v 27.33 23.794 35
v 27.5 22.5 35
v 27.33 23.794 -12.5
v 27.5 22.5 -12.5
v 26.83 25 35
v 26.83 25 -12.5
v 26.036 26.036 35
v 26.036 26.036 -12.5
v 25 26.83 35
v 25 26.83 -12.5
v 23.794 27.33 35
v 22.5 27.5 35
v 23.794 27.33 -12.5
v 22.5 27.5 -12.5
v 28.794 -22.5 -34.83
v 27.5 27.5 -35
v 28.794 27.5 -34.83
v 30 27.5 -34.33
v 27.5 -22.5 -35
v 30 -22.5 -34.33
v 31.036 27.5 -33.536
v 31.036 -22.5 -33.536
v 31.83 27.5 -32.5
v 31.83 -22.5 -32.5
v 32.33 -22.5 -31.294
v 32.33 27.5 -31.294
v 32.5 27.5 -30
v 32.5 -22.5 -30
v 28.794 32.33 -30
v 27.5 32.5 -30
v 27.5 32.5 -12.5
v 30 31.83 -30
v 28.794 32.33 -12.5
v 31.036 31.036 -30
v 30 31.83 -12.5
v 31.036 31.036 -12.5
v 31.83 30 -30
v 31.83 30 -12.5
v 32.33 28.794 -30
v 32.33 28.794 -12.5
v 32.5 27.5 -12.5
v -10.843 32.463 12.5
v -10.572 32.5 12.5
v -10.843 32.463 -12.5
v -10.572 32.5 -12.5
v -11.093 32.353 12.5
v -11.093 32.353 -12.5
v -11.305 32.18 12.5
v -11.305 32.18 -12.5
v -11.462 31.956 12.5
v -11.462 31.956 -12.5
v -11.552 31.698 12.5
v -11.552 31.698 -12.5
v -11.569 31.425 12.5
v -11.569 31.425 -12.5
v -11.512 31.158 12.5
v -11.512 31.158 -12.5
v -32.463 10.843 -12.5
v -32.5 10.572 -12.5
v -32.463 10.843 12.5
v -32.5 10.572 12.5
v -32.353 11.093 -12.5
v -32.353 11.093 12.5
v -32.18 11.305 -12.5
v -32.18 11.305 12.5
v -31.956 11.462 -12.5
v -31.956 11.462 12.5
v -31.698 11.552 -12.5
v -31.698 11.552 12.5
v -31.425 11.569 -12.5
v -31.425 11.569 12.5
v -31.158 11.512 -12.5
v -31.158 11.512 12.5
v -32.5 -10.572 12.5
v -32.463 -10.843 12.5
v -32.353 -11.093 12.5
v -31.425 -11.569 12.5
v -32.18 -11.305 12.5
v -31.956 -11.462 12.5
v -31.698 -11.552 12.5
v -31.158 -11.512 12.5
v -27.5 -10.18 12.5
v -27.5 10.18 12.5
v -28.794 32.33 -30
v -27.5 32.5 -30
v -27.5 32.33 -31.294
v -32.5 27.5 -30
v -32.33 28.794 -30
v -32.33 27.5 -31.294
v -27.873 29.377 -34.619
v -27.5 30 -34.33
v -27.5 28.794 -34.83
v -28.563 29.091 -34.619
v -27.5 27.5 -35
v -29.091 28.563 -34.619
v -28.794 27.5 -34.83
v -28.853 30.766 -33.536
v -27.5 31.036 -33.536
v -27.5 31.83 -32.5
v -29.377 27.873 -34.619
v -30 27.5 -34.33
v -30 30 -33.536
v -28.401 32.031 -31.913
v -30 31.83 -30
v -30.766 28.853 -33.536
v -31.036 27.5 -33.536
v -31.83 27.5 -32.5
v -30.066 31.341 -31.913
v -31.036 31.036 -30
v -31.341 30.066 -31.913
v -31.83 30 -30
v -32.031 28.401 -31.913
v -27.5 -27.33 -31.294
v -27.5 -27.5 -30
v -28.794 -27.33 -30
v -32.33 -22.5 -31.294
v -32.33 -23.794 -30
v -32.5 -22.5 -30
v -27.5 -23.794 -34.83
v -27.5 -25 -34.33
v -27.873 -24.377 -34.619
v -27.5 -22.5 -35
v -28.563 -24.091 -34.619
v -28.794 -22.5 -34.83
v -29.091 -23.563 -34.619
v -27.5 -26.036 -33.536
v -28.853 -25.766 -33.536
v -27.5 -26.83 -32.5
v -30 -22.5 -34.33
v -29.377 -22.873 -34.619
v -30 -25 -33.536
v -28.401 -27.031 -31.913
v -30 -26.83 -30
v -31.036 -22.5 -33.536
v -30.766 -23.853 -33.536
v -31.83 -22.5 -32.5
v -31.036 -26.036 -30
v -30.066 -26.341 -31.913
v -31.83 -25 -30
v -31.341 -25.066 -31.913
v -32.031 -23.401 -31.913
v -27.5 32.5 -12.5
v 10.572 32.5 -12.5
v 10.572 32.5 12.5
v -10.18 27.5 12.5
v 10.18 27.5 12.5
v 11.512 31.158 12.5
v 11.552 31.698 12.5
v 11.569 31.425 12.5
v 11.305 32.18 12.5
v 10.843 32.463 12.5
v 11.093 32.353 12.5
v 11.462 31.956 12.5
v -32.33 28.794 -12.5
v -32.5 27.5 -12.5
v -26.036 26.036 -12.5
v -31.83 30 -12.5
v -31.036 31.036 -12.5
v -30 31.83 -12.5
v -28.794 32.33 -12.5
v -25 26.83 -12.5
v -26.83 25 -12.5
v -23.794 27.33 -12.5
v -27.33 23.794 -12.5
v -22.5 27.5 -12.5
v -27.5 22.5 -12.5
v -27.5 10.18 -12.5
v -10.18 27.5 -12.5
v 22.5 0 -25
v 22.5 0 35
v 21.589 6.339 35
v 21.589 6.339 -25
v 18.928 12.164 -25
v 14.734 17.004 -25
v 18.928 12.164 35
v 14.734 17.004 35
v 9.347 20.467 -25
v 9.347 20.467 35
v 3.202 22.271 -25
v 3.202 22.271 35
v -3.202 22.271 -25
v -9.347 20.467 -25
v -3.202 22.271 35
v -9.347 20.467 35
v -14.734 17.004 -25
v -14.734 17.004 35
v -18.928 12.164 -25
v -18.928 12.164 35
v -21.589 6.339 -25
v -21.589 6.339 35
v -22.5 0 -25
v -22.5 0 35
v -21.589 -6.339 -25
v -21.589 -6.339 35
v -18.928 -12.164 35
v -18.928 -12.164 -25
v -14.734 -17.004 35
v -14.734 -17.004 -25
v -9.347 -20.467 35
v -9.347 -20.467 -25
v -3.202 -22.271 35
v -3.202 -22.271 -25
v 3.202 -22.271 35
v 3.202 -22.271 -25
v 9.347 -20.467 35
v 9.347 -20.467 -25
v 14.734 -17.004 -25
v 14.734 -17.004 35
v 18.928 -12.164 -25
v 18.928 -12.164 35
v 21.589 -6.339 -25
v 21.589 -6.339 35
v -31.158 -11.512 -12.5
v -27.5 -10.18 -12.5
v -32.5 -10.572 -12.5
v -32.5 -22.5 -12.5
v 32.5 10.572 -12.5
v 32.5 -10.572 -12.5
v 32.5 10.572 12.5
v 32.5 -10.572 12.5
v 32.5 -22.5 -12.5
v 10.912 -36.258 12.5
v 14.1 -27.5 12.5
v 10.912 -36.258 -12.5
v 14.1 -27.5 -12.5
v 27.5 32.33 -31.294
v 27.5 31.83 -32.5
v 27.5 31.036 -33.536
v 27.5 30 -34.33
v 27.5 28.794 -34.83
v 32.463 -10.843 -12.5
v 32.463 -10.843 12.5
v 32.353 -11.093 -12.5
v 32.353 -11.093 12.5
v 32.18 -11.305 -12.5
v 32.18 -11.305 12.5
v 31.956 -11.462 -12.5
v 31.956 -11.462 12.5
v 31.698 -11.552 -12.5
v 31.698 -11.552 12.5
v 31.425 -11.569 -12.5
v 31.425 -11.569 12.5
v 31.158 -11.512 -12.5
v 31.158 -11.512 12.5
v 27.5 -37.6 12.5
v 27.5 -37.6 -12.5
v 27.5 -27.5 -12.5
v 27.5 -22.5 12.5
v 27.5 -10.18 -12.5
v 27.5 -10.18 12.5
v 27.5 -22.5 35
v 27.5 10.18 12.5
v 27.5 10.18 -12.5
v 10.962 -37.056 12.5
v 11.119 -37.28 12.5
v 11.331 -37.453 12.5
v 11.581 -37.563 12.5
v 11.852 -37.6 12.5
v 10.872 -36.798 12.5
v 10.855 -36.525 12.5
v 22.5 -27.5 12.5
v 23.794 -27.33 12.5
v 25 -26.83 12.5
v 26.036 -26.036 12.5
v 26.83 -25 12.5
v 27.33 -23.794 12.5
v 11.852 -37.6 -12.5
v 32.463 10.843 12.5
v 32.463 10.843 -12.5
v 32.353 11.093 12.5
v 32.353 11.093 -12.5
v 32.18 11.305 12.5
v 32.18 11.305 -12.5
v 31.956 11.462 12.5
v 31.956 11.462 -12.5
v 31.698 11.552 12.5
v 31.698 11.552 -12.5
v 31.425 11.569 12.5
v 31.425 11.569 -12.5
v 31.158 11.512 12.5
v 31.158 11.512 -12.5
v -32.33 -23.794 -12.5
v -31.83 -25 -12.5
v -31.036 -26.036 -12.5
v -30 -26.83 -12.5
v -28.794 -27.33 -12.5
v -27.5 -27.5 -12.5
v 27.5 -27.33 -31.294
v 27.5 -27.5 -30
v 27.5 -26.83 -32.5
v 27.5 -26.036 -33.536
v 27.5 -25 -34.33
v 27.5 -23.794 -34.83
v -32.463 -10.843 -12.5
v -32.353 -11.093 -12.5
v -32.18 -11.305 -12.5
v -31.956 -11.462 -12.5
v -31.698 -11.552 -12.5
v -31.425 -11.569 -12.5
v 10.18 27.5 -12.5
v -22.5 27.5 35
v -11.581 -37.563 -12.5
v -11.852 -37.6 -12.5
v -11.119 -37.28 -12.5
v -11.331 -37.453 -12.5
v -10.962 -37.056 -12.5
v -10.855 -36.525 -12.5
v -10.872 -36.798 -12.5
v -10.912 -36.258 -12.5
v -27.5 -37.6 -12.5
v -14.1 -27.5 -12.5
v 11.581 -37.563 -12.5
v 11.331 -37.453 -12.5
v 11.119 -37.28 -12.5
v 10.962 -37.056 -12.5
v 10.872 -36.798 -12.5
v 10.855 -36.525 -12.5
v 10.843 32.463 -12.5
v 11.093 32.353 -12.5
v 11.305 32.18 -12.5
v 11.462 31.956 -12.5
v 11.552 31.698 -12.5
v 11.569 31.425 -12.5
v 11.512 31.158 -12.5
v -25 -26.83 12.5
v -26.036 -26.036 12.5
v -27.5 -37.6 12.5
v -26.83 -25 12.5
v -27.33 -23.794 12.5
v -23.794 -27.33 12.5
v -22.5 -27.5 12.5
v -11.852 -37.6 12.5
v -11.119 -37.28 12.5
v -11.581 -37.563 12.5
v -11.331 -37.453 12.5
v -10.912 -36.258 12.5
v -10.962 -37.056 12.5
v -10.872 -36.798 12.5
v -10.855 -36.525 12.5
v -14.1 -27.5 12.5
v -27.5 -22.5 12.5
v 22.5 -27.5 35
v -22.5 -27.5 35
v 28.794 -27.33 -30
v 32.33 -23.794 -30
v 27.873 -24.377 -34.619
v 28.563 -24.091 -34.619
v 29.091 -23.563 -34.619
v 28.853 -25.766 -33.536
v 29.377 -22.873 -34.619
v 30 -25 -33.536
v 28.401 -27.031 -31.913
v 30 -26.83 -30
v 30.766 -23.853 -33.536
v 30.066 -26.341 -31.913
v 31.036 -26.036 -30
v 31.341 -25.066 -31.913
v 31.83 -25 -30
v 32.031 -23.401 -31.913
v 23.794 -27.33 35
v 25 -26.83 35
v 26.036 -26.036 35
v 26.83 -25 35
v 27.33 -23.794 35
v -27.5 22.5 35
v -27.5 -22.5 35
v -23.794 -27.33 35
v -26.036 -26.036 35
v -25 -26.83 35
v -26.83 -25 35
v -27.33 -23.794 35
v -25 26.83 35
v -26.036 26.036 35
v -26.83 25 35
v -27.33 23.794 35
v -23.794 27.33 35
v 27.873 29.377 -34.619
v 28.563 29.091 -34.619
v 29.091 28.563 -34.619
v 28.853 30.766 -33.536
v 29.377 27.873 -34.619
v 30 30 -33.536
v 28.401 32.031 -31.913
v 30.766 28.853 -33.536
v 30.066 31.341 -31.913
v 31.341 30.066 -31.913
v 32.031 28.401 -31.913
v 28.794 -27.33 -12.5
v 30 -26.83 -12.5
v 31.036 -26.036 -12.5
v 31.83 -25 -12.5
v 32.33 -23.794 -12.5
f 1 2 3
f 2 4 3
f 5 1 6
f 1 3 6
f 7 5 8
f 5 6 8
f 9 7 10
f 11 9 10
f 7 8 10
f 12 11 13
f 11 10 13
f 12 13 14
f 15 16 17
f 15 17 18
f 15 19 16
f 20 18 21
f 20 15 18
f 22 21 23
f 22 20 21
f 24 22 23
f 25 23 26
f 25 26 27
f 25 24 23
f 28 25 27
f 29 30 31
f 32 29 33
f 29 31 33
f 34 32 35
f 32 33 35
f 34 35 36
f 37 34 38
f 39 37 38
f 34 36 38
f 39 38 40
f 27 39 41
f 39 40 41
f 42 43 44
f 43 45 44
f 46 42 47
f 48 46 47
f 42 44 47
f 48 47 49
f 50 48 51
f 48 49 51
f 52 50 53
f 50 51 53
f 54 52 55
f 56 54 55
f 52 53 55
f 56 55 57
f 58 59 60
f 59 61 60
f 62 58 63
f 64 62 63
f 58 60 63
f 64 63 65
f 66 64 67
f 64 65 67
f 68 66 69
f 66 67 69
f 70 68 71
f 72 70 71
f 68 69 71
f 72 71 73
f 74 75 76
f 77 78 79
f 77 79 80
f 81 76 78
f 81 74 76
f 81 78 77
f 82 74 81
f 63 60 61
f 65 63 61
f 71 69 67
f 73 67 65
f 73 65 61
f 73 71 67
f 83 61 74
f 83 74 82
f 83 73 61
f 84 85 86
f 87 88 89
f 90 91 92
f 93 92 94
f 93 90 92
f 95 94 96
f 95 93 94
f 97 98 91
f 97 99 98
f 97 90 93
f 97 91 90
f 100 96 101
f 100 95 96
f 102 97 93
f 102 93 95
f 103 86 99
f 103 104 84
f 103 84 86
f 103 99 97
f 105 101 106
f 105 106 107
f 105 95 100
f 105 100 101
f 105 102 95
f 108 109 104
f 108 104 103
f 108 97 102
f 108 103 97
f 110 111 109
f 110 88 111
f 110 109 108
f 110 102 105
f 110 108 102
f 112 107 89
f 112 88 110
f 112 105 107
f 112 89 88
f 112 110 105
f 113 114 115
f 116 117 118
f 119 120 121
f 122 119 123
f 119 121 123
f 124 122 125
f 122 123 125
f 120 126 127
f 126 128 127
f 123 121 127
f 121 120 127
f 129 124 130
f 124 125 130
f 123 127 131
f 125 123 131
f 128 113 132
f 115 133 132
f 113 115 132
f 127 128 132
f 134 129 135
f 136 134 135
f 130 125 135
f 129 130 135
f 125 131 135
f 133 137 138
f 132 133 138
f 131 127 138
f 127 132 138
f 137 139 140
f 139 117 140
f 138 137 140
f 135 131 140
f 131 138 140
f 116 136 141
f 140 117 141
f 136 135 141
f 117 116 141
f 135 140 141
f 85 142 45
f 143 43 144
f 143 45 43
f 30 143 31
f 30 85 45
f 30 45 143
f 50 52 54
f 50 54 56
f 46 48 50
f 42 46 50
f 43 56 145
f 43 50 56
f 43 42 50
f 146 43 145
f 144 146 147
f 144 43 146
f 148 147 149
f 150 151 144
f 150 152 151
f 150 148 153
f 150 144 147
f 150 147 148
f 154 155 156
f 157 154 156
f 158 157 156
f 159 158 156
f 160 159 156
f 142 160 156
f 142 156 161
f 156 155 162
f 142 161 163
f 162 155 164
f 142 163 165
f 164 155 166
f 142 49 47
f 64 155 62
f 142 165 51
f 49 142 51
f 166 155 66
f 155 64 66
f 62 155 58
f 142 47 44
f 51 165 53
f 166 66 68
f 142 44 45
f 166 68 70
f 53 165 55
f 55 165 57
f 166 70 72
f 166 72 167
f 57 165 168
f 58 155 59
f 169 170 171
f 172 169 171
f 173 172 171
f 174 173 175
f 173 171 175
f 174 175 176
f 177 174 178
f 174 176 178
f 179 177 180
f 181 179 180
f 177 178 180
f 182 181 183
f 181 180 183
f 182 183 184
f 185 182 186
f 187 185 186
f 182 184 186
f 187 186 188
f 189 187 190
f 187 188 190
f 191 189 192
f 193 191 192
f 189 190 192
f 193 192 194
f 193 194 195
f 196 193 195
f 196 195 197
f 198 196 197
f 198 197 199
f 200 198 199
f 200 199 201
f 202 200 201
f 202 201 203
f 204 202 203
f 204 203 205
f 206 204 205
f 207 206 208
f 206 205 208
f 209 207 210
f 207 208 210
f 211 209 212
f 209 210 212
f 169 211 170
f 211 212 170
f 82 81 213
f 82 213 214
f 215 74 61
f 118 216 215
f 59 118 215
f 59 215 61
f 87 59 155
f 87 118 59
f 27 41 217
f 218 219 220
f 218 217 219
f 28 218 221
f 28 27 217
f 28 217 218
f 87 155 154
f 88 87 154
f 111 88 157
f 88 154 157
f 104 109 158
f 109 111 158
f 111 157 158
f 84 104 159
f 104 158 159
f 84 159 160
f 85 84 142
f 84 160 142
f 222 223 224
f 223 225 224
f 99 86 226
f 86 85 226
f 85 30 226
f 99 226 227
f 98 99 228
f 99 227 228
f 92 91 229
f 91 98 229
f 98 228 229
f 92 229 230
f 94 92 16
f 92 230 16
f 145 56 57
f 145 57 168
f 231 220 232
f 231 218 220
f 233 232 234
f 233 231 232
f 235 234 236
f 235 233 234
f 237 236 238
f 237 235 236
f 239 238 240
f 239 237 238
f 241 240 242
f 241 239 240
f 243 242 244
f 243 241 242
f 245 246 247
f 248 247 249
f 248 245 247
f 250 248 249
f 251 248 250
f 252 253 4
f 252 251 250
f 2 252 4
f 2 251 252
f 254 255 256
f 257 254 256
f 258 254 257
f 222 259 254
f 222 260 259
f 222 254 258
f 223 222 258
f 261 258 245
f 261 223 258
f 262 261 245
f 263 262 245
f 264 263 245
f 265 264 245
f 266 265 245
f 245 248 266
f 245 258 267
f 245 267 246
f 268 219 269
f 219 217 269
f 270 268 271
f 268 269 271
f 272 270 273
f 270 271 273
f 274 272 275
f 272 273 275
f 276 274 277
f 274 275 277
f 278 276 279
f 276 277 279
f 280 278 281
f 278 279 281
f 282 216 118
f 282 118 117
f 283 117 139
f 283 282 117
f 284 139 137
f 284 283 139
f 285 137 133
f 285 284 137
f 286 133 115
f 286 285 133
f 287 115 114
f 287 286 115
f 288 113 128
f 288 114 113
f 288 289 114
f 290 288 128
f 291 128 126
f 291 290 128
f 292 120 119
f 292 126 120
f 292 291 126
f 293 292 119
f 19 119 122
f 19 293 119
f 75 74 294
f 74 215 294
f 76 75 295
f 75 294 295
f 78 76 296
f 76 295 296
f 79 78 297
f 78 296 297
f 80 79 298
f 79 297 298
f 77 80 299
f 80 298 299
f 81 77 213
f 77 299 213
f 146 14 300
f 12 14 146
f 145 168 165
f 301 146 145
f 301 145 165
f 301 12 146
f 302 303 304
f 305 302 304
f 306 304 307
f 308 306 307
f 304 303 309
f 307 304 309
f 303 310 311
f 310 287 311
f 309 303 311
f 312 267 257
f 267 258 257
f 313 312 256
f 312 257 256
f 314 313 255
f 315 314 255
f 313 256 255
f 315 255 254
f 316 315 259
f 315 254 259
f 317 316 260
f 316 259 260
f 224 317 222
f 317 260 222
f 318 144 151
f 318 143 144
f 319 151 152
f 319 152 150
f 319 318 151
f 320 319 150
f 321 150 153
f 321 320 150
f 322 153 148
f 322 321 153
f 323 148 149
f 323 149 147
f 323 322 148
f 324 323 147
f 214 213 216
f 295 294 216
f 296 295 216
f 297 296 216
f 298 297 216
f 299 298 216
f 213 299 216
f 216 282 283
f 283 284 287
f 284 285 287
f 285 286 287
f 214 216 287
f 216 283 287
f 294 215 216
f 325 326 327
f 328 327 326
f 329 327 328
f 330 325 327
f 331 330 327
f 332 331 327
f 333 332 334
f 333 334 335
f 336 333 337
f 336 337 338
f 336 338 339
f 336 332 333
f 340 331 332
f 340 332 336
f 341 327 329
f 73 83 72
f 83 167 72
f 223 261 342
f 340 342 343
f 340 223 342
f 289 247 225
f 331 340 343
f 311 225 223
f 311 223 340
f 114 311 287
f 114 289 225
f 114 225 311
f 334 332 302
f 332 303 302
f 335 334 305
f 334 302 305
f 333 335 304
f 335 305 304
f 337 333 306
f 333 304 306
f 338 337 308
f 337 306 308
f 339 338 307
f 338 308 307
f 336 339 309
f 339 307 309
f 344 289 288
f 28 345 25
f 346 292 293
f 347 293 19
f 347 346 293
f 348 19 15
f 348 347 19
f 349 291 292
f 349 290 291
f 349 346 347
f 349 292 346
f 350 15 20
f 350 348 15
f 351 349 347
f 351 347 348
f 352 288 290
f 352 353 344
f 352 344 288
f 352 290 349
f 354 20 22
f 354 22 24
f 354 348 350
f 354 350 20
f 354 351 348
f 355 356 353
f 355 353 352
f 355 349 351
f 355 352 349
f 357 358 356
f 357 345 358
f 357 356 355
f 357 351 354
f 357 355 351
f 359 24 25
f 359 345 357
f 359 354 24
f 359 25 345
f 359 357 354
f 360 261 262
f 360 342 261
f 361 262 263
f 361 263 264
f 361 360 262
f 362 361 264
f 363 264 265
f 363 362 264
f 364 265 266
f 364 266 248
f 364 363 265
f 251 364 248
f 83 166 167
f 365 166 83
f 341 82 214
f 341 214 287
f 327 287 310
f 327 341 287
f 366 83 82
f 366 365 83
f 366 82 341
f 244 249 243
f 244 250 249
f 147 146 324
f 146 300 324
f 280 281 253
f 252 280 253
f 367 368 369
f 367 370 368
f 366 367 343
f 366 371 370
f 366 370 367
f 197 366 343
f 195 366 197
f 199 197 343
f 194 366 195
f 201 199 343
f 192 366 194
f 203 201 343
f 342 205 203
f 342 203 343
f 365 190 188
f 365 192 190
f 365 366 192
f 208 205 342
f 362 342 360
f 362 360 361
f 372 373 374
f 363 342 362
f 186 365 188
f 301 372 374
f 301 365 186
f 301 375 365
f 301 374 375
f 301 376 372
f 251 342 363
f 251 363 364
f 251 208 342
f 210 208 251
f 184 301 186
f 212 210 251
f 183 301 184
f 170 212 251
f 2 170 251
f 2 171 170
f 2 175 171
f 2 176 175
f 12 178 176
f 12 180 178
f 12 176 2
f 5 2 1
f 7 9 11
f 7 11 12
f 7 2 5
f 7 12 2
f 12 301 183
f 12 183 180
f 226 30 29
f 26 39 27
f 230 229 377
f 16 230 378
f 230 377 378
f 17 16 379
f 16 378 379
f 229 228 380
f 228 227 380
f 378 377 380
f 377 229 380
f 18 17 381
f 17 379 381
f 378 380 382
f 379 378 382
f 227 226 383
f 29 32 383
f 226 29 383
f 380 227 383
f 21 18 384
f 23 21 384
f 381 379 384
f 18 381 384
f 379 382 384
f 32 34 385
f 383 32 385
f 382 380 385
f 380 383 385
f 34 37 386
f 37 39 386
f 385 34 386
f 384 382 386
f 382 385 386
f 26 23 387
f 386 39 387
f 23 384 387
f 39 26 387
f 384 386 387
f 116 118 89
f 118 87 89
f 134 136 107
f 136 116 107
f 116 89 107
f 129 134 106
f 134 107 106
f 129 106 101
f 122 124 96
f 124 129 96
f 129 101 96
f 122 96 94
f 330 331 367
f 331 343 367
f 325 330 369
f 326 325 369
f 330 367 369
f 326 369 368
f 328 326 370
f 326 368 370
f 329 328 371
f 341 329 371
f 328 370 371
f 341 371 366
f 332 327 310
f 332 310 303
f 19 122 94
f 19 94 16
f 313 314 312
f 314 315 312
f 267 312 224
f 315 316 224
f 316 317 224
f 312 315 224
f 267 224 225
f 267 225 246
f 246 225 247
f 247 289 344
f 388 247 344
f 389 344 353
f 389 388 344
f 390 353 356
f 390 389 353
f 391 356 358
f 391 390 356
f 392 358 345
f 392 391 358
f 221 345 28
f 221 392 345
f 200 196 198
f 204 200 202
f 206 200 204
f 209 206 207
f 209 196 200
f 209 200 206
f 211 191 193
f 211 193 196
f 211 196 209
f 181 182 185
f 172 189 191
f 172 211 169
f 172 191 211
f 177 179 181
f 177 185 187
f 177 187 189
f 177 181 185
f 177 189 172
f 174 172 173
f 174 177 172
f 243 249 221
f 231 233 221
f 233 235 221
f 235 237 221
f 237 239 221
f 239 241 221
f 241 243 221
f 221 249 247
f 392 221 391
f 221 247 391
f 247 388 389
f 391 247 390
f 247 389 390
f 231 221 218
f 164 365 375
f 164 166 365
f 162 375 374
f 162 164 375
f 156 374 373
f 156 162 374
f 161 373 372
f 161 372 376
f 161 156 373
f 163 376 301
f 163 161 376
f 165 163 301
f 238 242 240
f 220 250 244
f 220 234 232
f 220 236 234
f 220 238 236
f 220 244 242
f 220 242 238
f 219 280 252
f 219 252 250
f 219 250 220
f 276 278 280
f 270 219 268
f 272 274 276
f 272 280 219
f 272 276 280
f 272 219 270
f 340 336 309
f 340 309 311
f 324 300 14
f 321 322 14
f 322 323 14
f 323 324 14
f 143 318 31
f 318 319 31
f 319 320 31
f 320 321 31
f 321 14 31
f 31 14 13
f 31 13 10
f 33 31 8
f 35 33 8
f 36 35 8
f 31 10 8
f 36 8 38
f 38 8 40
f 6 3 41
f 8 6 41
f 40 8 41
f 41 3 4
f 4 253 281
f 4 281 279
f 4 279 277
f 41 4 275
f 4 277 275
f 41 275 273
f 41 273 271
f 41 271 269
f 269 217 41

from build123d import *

# Parameters (mm, degrees)
F1_DEPTH = 35
F2_DEPTH = 12.5
F3_W     = 55
F3_H     = 55
F4_DEPTH = 22.5
F5_R     = 22.5
F6_DEPTH = 60
F7_R     = 5
F8_R     = 1


with BuildPart() as f1:
    # F0 (on Top) → F1 (new body, symmetric)
    with BuildSketch(Plane.XY):
        Polygon((-10.1801488287, 27.5), (-27.5, 27.5), (-27.5, 10.1801488287), (-27.5, -10.1801488287), (-27.5, -27.5), (-14.1, -27.5), (14.1, -27.5), (27.5, -27.5), (27.5, -10.1801488287), (27.5, 10.1801488287), (27.5, 27.5), (10.1801488287, 27.5), align=None)
    extrude(amount=F1_DEPTH, both=True)

    # F0 (on Top) → F2 (join, symmetric)
    with BuildSketch(Plane.XY):
        Polygon((-12, 32.5), (-10.1801488287, 27.5), (10.1801488287, 27.5), (12, 32.5), align=None)
        Polygon((-27.5, -10.1801488287), (-27.5, 10.1801488287), (-32.5, 12), (-32.5, -12), align=None)
        Polygon((-14.1, -27.5), (-27.5, -27.5), (-27.5, -37.6), (-10.4239006339, -37.6), align=None)
        Polygon((27.5, -27.5), (14.1, -27.5), (10.4239006339, -37.6), (27.5, -37.6), align=None)
        Polygon((32.5, 12), (27.5, 10.1801488287), (27.5, -10.1801488287), (32.5, -12), align=None)
    extrude(amount=F2_DEPTH, both=True)

    # F3 (on face) → F4 (join, through all)
    with BuildSketch(Plane(origin=(0, 0, -35), x_dir=(1, 0, 0), z_dir=(0, 0, -1))):
        Rectangle(F3_W, F3_H)
        Polygon((27.5, 27.5), (27.5, -27.5), (-27.5, -27.5), (-27.5, 27.5), (-32.5, 27.5), (-32.5, -32.5), (32.5, -32.5), (32.5, 27.5), align=None)
    extrude(amount=-F4_DEPTH)

    # F5 (on face) → F6 (cut)
    with BuildSketch(Plane.XY.offset(35)):
        Circle(F5_R)
    extrude(amount=-F6_DEPTH, mode=Mode.SUBTRACT)

    # F7
    f7_edges = [f1.edges().sort_by_distance(p)[0] for p in [
        (-27.5, -27.5, 23.75),
        (-32.5, -27.5, -23.75),
        (27.5, -27.5, 23.75),
        (32.5, -27.5, -23.75),
        (27.5, 27.5, 11.25),
        (32.5, 32.5, -23.75),
        (-27.5, 27.5, 11.25),
        (-32.5, 32.5, -23.75),
        (0, -27.5, -35),
        (0, 32.5, -35),
        (32.5, 2.5, -35),
        (-32.5, 2.5, -35),
    ]]
    fillet(f7_edges, radius=F7_R)

    # F8
    f8_edges = [f1.edges().sort_by_distance(p)[0] for p in [
        (32.5, 12, 0),
        (32.5, -12, 0),
        (10.423901, -37.6, 0),
        (-10.423901, -37.6, 0),
        (-32.5, -12, 0),
        (-32.5, 12, 0),
        (-12, 32.5, 0),
        (12, 32.5, 0),
    ]]
    fillet(f8_edges, radius=F8_R)


solid = f1.part
